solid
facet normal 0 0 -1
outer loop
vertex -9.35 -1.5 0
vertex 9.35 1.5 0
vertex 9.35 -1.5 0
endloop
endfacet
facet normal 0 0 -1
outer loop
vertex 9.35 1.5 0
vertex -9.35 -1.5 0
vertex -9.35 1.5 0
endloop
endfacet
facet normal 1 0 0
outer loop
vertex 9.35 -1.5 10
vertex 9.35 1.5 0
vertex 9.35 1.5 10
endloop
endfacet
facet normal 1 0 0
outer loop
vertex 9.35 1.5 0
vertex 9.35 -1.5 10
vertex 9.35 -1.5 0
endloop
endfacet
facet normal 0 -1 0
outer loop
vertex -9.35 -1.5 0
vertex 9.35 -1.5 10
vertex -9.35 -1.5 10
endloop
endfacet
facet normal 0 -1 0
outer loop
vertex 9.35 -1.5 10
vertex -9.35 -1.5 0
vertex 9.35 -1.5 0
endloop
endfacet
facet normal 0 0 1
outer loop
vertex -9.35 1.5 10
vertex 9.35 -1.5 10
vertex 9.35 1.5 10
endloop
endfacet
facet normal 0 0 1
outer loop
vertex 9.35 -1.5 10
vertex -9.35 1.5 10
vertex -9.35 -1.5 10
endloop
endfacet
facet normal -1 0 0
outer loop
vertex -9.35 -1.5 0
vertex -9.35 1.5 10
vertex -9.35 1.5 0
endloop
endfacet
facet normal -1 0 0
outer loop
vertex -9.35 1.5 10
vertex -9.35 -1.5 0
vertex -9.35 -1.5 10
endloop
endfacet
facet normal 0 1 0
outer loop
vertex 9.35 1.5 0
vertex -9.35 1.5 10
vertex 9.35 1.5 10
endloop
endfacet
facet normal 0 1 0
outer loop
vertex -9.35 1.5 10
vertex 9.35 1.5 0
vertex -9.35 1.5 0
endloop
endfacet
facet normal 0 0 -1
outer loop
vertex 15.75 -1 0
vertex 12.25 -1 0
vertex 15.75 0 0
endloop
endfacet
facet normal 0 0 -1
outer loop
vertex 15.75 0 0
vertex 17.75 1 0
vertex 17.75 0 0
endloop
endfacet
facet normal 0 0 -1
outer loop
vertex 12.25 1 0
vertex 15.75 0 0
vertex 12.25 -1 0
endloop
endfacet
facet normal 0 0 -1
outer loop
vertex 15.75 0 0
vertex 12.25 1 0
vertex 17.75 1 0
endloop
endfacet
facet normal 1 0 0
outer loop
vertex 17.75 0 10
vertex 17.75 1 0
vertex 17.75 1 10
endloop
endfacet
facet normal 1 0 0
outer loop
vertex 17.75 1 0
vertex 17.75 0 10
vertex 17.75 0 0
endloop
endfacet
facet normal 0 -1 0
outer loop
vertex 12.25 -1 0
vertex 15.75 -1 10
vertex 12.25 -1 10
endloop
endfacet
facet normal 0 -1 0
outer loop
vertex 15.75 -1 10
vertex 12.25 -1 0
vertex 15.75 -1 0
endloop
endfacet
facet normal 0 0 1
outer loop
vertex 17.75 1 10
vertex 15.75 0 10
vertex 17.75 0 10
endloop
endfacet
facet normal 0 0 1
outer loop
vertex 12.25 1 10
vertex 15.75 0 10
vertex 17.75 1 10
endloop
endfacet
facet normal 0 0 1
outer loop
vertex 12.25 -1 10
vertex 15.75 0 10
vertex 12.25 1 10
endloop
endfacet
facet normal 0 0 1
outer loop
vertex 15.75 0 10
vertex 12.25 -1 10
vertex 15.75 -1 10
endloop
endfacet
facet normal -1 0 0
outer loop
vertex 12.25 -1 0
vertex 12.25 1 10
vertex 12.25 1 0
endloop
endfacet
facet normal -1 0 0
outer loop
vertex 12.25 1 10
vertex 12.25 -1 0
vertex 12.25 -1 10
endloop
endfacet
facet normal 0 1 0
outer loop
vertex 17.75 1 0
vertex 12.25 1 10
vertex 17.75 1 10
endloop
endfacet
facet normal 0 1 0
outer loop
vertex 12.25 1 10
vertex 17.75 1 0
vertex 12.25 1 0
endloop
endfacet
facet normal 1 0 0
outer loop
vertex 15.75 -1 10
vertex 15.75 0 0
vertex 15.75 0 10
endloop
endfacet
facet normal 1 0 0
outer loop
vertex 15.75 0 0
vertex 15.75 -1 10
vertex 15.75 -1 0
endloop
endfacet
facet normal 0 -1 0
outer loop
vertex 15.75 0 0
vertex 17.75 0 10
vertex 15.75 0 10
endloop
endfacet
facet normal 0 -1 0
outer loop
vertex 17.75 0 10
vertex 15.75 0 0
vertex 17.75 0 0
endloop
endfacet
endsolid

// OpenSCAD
// Built by bench/smallmodels/features/compiler.py from a list of features.
$fn = 64;
difference() {
  union() {
    translate([0, 0, 0]) linear_extrude(height = 10) polygon([[-9.35, -1.5], [9.35, -1.5], [9.35, 1.5], [-9.35, 1.5]]);
    translate([15, 0, 0]) linear_extrude(height = 10) polygon([[-2.75, -1], [2.75, -1], [2.75, 1], [-2.75, 1]]);
  }
  union() {
    translate([-18.7, -1.5, 0]) rotate([0, 0, 0]) translate([-5, -1.5, 0]) cube([10, 3, 10]);
    translate([20.75, -1.5, 0]) rotate([0, 0, 0]) translate([-5, -1.5, 0]) cube([10, 3, 10]);
  }
}
